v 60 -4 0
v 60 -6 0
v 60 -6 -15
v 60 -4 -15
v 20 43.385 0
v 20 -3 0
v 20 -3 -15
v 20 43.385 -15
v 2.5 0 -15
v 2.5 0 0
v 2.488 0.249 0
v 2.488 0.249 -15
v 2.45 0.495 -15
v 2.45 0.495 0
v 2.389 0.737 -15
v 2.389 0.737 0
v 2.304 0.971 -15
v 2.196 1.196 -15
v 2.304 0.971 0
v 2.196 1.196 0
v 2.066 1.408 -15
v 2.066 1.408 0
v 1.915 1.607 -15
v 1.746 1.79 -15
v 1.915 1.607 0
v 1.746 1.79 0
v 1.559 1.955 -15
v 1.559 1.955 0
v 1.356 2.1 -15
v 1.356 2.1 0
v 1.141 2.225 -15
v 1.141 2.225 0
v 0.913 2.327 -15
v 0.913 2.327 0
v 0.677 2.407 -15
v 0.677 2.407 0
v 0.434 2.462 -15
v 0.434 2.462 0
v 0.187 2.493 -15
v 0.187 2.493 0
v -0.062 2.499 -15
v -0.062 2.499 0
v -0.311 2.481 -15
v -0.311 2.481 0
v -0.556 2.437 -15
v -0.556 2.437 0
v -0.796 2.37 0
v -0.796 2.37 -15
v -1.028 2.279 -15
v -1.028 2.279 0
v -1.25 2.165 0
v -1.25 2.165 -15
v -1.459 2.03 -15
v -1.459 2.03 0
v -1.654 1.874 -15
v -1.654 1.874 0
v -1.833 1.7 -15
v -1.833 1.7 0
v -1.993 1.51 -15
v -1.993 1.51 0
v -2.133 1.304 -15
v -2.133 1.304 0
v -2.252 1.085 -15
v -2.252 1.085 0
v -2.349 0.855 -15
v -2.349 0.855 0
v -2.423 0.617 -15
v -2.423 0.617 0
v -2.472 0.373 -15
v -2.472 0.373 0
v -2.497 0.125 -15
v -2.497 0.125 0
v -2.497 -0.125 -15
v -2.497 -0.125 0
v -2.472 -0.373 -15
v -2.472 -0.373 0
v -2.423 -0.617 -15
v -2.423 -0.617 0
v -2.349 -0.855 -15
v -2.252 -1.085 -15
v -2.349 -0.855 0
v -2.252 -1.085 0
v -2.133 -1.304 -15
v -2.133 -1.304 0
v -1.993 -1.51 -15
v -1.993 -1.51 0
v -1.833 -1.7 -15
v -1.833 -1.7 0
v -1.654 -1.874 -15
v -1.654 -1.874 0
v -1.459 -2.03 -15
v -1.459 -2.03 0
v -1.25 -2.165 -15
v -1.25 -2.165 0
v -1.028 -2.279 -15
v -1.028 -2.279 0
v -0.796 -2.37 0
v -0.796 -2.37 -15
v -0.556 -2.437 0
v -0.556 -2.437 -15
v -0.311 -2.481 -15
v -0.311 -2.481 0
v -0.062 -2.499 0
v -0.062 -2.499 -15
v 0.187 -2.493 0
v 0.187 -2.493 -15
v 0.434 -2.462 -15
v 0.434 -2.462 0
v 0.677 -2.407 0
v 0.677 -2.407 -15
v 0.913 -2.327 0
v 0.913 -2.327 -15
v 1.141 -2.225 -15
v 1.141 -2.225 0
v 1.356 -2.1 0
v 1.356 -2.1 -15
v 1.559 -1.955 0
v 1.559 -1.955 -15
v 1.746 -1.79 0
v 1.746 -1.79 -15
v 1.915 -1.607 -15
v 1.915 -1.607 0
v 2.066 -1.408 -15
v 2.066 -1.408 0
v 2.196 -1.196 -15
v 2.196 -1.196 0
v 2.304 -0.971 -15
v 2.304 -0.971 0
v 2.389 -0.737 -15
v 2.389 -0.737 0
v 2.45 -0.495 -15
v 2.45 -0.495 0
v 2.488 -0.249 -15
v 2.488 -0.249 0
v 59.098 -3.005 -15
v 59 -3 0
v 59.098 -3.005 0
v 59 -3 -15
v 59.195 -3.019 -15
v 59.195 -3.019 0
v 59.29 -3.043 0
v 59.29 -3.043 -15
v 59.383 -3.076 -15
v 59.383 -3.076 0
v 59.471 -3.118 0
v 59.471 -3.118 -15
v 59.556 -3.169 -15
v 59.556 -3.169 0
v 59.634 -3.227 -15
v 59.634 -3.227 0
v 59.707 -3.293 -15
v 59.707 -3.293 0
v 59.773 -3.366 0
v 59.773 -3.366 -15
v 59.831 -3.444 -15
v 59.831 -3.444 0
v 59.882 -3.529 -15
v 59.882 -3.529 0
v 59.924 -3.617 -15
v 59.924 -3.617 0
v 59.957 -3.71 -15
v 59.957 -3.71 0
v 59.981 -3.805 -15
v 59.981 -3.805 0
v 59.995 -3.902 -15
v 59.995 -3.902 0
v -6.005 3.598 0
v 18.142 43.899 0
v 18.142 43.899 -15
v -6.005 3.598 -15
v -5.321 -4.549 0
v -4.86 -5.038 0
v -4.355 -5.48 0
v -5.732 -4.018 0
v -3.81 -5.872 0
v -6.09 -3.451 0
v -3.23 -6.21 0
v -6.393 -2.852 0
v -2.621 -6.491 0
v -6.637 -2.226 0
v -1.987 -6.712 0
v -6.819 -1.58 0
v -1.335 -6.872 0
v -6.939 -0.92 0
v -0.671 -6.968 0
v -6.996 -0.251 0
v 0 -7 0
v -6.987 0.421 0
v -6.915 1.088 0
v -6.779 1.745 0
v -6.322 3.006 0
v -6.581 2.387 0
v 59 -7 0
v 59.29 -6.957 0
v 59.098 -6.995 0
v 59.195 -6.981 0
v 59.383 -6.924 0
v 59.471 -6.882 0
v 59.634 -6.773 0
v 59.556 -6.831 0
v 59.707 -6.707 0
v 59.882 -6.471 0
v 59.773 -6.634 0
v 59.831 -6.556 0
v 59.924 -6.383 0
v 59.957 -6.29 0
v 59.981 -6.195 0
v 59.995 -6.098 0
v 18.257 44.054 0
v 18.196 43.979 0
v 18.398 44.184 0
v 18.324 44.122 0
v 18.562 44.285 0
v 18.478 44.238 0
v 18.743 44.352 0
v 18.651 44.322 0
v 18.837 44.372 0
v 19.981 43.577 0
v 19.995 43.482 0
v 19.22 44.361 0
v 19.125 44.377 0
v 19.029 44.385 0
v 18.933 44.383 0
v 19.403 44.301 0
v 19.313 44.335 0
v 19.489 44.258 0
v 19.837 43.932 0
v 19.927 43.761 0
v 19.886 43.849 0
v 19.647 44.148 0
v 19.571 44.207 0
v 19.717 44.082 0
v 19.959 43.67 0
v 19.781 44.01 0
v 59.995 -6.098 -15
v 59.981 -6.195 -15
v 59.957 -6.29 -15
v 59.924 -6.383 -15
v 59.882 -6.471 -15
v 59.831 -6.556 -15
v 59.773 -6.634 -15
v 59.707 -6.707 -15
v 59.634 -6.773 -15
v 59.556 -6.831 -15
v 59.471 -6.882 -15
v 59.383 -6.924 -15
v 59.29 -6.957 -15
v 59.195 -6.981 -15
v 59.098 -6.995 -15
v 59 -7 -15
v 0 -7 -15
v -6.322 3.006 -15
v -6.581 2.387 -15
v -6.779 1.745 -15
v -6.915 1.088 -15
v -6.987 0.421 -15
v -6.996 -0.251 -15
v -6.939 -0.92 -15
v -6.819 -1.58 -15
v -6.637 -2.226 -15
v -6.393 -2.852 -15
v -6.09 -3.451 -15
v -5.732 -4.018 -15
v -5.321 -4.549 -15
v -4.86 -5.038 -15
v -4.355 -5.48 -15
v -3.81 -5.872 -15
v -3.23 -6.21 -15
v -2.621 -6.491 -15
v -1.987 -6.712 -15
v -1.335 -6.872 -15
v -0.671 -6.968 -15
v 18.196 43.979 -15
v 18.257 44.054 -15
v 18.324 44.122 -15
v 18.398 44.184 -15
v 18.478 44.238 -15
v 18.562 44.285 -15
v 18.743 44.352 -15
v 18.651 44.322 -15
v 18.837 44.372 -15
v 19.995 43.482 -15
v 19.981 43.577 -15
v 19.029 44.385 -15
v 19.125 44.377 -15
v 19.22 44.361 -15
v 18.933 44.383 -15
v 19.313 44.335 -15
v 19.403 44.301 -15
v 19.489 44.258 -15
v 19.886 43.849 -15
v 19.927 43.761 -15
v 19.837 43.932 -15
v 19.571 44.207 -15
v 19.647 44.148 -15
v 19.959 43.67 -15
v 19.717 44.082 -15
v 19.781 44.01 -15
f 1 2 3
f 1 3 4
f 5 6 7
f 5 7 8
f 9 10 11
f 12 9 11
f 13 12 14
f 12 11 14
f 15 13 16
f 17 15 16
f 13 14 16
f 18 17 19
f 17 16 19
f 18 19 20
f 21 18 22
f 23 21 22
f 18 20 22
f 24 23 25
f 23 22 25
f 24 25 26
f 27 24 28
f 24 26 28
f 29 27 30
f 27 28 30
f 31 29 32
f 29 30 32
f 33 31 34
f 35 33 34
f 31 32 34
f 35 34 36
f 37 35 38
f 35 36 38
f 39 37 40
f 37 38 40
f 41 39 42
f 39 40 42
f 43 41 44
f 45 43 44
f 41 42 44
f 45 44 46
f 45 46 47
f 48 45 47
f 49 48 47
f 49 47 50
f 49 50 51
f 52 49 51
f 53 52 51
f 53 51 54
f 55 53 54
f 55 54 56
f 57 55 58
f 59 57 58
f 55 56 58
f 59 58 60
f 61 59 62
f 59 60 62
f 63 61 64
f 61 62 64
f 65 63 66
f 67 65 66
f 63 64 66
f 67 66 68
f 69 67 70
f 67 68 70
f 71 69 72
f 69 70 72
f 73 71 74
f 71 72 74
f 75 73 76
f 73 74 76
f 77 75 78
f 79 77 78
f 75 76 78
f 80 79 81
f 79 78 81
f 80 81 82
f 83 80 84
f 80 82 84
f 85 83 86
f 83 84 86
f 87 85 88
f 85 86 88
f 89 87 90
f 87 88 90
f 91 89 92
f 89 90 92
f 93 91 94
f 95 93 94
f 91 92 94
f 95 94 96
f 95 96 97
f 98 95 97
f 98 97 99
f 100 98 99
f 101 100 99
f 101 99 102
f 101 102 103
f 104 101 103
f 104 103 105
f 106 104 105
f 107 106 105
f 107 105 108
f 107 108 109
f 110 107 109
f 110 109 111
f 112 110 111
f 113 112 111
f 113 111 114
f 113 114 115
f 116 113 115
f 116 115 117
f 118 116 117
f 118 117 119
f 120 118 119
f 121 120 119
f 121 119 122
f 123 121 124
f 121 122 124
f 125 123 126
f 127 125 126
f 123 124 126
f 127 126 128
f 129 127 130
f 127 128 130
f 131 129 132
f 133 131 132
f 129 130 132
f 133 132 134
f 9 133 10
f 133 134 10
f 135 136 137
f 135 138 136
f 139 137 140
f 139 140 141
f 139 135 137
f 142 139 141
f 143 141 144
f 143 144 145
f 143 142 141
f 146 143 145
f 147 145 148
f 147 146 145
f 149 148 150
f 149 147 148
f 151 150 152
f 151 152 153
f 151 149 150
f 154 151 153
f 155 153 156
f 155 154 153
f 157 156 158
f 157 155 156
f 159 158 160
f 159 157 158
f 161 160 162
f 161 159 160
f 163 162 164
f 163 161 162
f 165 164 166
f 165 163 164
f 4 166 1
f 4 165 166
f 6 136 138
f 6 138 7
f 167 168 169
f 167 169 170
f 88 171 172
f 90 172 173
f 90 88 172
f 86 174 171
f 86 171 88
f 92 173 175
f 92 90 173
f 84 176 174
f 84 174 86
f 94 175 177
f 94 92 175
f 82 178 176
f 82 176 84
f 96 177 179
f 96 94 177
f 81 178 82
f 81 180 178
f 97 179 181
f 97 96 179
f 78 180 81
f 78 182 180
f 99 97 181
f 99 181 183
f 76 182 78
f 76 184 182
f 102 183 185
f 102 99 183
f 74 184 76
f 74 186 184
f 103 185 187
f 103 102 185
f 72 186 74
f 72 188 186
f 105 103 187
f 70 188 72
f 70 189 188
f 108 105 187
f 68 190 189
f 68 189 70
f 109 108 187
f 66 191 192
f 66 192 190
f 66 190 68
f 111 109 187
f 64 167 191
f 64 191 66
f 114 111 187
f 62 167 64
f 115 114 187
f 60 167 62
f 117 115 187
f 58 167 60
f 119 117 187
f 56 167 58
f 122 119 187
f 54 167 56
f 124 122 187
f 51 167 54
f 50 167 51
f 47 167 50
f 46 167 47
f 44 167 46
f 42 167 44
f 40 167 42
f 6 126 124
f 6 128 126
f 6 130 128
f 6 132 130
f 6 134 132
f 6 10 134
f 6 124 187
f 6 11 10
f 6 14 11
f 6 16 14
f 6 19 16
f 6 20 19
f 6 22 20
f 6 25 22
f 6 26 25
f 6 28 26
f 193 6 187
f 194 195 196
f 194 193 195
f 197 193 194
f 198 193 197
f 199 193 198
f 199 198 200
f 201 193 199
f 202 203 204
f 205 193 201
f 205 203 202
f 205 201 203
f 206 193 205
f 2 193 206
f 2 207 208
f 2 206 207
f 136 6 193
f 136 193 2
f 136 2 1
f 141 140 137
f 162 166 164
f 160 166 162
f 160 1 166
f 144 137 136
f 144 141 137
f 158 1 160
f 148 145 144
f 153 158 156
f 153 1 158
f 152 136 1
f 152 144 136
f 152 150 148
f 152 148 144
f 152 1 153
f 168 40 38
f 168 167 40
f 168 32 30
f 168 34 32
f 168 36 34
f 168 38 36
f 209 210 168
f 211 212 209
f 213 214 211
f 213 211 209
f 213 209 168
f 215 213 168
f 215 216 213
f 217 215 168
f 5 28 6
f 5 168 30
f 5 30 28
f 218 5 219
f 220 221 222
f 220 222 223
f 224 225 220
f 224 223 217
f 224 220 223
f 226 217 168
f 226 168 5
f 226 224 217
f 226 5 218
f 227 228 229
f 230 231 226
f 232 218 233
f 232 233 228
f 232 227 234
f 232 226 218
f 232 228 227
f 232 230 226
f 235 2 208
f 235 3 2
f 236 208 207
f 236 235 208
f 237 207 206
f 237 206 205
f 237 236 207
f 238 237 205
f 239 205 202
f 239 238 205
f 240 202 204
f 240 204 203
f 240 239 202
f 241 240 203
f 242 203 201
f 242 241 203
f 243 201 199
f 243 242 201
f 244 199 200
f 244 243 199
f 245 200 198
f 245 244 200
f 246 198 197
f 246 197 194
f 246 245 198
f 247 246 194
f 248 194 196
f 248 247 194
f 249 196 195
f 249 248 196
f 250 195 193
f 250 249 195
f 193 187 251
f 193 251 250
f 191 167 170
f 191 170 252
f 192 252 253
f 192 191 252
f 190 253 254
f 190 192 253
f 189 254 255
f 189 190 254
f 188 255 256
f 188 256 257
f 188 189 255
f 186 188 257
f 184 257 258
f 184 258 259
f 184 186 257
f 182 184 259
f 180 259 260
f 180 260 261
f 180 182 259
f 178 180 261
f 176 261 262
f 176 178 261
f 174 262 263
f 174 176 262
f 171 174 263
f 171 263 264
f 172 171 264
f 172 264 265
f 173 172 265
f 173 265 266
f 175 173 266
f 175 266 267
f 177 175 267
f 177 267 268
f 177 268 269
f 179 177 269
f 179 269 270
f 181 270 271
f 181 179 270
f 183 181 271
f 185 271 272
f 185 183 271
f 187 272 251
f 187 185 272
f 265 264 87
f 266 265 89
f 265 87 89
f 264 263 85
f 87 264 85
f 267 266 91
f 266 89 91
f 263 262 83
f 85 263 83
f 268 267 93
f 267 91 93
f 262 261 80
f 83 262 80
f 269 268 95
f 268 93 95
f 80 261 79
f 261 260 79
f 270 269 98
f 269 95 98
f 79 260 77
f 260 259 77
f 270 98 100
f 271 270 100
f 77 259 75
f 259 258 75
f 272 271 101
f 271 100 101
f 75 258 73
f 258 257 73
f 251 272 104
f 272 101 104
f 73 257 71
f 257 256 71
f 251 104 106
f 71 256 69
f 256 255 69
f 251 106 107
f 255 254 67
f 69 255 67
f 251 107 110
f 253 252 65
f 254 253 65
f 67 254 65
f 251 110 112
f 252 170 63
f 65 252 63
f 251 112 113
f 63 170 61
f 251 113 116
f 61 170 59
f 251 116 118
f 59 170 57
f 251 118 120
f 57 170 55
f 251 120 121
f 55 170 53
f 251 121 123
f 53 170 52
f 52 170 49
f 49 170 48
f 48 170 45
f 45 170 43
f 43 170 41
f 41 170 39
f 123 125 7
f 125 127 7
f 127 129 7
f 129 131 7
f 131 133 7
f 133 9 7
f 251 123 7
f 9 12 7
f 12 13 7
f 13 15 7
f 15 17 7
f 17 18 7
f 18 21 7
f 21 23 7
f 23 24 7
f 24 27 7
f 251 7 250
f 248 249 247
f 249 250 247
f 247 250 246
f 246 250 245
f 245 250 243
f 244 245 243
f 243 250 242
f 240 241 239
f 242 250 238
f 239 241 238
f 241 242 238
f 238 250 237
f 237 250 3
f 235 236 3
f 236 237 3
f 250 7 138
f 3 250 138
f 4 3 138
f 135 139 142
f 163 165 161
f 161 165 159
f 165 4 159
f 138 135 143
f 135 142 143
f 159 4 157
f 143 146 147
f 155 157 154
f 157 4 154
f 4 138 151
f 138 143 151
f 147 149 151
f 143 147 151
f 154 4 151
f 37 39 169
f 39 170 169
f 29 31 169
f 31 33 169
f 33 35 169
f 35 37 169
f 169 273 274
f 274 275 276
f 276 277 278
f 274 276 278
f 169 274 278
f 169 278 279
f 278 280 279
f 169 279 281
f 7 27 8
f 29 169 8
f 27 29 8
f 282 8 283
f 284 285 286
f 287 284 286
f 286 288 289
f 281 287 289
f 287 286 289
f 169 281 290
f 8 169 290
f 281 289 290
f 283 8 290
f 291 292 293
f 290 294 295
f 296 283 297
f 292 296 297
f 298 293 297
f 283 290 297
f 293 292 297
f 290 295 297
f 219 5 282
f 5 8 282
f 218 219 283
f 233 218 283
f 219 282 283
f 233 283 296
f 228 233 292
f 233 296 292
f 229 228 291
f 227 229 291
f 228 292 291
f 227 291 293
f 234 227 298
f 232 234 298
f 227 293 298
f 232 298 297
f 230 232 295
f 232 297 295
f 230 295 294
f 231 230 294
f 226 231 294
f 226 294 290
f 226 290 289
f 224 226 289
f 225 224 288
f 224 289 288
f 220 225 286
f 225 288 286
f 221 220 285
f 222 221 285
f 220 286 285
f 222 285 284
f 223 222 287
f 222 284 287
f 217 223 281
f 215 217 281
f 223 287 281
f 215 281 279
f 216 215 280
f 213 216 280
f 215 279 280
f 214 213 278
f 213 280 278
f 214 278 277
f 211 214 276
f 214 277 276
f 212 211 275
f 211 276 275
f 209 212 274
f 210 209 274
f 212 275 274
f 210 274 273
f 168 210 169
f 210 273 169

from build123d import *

# Parameters (mm, degrees)
ESQUISSE1_R        = 2.5
BOSS_EXTRU_1_DEPTH = 15
CONG_1_R           = 1


with BuildPart() as part:
    # Esquisse1 → Boss.-Extru.1 (new body)
    with BuildSketch(Plane.XY):
        with BuildLine():
            Line((20, -3), (20, 47))
            Line((20, 47), (-6.004687468, 3.597739348))
            ThreePointArc((-6.004687468, 3.597739348), (-6.09032739, -3.4507843), (0, -7))
            Line((0, -7), (60, -7))
            Line((60, -7), (60, -3))
            Line((60, -3), (20, -3))
        make_face()
        Circle(ESQUISSE1_R, mode=Mode.SUBTRACT)
    extrude(amount=-BOSS_EXTRU_1_DEPTH)

    # Congé1
    cong_1_edges = [part.edges().sort_by_distance(p)[0] for p in [
        (60, -3, -7.5),
        (60, -7, -7.5),
        (20, 47, -7.5),
    ]]
    fillet(cong_1_edges, radius=CONG_1_R)


solid = part.part
